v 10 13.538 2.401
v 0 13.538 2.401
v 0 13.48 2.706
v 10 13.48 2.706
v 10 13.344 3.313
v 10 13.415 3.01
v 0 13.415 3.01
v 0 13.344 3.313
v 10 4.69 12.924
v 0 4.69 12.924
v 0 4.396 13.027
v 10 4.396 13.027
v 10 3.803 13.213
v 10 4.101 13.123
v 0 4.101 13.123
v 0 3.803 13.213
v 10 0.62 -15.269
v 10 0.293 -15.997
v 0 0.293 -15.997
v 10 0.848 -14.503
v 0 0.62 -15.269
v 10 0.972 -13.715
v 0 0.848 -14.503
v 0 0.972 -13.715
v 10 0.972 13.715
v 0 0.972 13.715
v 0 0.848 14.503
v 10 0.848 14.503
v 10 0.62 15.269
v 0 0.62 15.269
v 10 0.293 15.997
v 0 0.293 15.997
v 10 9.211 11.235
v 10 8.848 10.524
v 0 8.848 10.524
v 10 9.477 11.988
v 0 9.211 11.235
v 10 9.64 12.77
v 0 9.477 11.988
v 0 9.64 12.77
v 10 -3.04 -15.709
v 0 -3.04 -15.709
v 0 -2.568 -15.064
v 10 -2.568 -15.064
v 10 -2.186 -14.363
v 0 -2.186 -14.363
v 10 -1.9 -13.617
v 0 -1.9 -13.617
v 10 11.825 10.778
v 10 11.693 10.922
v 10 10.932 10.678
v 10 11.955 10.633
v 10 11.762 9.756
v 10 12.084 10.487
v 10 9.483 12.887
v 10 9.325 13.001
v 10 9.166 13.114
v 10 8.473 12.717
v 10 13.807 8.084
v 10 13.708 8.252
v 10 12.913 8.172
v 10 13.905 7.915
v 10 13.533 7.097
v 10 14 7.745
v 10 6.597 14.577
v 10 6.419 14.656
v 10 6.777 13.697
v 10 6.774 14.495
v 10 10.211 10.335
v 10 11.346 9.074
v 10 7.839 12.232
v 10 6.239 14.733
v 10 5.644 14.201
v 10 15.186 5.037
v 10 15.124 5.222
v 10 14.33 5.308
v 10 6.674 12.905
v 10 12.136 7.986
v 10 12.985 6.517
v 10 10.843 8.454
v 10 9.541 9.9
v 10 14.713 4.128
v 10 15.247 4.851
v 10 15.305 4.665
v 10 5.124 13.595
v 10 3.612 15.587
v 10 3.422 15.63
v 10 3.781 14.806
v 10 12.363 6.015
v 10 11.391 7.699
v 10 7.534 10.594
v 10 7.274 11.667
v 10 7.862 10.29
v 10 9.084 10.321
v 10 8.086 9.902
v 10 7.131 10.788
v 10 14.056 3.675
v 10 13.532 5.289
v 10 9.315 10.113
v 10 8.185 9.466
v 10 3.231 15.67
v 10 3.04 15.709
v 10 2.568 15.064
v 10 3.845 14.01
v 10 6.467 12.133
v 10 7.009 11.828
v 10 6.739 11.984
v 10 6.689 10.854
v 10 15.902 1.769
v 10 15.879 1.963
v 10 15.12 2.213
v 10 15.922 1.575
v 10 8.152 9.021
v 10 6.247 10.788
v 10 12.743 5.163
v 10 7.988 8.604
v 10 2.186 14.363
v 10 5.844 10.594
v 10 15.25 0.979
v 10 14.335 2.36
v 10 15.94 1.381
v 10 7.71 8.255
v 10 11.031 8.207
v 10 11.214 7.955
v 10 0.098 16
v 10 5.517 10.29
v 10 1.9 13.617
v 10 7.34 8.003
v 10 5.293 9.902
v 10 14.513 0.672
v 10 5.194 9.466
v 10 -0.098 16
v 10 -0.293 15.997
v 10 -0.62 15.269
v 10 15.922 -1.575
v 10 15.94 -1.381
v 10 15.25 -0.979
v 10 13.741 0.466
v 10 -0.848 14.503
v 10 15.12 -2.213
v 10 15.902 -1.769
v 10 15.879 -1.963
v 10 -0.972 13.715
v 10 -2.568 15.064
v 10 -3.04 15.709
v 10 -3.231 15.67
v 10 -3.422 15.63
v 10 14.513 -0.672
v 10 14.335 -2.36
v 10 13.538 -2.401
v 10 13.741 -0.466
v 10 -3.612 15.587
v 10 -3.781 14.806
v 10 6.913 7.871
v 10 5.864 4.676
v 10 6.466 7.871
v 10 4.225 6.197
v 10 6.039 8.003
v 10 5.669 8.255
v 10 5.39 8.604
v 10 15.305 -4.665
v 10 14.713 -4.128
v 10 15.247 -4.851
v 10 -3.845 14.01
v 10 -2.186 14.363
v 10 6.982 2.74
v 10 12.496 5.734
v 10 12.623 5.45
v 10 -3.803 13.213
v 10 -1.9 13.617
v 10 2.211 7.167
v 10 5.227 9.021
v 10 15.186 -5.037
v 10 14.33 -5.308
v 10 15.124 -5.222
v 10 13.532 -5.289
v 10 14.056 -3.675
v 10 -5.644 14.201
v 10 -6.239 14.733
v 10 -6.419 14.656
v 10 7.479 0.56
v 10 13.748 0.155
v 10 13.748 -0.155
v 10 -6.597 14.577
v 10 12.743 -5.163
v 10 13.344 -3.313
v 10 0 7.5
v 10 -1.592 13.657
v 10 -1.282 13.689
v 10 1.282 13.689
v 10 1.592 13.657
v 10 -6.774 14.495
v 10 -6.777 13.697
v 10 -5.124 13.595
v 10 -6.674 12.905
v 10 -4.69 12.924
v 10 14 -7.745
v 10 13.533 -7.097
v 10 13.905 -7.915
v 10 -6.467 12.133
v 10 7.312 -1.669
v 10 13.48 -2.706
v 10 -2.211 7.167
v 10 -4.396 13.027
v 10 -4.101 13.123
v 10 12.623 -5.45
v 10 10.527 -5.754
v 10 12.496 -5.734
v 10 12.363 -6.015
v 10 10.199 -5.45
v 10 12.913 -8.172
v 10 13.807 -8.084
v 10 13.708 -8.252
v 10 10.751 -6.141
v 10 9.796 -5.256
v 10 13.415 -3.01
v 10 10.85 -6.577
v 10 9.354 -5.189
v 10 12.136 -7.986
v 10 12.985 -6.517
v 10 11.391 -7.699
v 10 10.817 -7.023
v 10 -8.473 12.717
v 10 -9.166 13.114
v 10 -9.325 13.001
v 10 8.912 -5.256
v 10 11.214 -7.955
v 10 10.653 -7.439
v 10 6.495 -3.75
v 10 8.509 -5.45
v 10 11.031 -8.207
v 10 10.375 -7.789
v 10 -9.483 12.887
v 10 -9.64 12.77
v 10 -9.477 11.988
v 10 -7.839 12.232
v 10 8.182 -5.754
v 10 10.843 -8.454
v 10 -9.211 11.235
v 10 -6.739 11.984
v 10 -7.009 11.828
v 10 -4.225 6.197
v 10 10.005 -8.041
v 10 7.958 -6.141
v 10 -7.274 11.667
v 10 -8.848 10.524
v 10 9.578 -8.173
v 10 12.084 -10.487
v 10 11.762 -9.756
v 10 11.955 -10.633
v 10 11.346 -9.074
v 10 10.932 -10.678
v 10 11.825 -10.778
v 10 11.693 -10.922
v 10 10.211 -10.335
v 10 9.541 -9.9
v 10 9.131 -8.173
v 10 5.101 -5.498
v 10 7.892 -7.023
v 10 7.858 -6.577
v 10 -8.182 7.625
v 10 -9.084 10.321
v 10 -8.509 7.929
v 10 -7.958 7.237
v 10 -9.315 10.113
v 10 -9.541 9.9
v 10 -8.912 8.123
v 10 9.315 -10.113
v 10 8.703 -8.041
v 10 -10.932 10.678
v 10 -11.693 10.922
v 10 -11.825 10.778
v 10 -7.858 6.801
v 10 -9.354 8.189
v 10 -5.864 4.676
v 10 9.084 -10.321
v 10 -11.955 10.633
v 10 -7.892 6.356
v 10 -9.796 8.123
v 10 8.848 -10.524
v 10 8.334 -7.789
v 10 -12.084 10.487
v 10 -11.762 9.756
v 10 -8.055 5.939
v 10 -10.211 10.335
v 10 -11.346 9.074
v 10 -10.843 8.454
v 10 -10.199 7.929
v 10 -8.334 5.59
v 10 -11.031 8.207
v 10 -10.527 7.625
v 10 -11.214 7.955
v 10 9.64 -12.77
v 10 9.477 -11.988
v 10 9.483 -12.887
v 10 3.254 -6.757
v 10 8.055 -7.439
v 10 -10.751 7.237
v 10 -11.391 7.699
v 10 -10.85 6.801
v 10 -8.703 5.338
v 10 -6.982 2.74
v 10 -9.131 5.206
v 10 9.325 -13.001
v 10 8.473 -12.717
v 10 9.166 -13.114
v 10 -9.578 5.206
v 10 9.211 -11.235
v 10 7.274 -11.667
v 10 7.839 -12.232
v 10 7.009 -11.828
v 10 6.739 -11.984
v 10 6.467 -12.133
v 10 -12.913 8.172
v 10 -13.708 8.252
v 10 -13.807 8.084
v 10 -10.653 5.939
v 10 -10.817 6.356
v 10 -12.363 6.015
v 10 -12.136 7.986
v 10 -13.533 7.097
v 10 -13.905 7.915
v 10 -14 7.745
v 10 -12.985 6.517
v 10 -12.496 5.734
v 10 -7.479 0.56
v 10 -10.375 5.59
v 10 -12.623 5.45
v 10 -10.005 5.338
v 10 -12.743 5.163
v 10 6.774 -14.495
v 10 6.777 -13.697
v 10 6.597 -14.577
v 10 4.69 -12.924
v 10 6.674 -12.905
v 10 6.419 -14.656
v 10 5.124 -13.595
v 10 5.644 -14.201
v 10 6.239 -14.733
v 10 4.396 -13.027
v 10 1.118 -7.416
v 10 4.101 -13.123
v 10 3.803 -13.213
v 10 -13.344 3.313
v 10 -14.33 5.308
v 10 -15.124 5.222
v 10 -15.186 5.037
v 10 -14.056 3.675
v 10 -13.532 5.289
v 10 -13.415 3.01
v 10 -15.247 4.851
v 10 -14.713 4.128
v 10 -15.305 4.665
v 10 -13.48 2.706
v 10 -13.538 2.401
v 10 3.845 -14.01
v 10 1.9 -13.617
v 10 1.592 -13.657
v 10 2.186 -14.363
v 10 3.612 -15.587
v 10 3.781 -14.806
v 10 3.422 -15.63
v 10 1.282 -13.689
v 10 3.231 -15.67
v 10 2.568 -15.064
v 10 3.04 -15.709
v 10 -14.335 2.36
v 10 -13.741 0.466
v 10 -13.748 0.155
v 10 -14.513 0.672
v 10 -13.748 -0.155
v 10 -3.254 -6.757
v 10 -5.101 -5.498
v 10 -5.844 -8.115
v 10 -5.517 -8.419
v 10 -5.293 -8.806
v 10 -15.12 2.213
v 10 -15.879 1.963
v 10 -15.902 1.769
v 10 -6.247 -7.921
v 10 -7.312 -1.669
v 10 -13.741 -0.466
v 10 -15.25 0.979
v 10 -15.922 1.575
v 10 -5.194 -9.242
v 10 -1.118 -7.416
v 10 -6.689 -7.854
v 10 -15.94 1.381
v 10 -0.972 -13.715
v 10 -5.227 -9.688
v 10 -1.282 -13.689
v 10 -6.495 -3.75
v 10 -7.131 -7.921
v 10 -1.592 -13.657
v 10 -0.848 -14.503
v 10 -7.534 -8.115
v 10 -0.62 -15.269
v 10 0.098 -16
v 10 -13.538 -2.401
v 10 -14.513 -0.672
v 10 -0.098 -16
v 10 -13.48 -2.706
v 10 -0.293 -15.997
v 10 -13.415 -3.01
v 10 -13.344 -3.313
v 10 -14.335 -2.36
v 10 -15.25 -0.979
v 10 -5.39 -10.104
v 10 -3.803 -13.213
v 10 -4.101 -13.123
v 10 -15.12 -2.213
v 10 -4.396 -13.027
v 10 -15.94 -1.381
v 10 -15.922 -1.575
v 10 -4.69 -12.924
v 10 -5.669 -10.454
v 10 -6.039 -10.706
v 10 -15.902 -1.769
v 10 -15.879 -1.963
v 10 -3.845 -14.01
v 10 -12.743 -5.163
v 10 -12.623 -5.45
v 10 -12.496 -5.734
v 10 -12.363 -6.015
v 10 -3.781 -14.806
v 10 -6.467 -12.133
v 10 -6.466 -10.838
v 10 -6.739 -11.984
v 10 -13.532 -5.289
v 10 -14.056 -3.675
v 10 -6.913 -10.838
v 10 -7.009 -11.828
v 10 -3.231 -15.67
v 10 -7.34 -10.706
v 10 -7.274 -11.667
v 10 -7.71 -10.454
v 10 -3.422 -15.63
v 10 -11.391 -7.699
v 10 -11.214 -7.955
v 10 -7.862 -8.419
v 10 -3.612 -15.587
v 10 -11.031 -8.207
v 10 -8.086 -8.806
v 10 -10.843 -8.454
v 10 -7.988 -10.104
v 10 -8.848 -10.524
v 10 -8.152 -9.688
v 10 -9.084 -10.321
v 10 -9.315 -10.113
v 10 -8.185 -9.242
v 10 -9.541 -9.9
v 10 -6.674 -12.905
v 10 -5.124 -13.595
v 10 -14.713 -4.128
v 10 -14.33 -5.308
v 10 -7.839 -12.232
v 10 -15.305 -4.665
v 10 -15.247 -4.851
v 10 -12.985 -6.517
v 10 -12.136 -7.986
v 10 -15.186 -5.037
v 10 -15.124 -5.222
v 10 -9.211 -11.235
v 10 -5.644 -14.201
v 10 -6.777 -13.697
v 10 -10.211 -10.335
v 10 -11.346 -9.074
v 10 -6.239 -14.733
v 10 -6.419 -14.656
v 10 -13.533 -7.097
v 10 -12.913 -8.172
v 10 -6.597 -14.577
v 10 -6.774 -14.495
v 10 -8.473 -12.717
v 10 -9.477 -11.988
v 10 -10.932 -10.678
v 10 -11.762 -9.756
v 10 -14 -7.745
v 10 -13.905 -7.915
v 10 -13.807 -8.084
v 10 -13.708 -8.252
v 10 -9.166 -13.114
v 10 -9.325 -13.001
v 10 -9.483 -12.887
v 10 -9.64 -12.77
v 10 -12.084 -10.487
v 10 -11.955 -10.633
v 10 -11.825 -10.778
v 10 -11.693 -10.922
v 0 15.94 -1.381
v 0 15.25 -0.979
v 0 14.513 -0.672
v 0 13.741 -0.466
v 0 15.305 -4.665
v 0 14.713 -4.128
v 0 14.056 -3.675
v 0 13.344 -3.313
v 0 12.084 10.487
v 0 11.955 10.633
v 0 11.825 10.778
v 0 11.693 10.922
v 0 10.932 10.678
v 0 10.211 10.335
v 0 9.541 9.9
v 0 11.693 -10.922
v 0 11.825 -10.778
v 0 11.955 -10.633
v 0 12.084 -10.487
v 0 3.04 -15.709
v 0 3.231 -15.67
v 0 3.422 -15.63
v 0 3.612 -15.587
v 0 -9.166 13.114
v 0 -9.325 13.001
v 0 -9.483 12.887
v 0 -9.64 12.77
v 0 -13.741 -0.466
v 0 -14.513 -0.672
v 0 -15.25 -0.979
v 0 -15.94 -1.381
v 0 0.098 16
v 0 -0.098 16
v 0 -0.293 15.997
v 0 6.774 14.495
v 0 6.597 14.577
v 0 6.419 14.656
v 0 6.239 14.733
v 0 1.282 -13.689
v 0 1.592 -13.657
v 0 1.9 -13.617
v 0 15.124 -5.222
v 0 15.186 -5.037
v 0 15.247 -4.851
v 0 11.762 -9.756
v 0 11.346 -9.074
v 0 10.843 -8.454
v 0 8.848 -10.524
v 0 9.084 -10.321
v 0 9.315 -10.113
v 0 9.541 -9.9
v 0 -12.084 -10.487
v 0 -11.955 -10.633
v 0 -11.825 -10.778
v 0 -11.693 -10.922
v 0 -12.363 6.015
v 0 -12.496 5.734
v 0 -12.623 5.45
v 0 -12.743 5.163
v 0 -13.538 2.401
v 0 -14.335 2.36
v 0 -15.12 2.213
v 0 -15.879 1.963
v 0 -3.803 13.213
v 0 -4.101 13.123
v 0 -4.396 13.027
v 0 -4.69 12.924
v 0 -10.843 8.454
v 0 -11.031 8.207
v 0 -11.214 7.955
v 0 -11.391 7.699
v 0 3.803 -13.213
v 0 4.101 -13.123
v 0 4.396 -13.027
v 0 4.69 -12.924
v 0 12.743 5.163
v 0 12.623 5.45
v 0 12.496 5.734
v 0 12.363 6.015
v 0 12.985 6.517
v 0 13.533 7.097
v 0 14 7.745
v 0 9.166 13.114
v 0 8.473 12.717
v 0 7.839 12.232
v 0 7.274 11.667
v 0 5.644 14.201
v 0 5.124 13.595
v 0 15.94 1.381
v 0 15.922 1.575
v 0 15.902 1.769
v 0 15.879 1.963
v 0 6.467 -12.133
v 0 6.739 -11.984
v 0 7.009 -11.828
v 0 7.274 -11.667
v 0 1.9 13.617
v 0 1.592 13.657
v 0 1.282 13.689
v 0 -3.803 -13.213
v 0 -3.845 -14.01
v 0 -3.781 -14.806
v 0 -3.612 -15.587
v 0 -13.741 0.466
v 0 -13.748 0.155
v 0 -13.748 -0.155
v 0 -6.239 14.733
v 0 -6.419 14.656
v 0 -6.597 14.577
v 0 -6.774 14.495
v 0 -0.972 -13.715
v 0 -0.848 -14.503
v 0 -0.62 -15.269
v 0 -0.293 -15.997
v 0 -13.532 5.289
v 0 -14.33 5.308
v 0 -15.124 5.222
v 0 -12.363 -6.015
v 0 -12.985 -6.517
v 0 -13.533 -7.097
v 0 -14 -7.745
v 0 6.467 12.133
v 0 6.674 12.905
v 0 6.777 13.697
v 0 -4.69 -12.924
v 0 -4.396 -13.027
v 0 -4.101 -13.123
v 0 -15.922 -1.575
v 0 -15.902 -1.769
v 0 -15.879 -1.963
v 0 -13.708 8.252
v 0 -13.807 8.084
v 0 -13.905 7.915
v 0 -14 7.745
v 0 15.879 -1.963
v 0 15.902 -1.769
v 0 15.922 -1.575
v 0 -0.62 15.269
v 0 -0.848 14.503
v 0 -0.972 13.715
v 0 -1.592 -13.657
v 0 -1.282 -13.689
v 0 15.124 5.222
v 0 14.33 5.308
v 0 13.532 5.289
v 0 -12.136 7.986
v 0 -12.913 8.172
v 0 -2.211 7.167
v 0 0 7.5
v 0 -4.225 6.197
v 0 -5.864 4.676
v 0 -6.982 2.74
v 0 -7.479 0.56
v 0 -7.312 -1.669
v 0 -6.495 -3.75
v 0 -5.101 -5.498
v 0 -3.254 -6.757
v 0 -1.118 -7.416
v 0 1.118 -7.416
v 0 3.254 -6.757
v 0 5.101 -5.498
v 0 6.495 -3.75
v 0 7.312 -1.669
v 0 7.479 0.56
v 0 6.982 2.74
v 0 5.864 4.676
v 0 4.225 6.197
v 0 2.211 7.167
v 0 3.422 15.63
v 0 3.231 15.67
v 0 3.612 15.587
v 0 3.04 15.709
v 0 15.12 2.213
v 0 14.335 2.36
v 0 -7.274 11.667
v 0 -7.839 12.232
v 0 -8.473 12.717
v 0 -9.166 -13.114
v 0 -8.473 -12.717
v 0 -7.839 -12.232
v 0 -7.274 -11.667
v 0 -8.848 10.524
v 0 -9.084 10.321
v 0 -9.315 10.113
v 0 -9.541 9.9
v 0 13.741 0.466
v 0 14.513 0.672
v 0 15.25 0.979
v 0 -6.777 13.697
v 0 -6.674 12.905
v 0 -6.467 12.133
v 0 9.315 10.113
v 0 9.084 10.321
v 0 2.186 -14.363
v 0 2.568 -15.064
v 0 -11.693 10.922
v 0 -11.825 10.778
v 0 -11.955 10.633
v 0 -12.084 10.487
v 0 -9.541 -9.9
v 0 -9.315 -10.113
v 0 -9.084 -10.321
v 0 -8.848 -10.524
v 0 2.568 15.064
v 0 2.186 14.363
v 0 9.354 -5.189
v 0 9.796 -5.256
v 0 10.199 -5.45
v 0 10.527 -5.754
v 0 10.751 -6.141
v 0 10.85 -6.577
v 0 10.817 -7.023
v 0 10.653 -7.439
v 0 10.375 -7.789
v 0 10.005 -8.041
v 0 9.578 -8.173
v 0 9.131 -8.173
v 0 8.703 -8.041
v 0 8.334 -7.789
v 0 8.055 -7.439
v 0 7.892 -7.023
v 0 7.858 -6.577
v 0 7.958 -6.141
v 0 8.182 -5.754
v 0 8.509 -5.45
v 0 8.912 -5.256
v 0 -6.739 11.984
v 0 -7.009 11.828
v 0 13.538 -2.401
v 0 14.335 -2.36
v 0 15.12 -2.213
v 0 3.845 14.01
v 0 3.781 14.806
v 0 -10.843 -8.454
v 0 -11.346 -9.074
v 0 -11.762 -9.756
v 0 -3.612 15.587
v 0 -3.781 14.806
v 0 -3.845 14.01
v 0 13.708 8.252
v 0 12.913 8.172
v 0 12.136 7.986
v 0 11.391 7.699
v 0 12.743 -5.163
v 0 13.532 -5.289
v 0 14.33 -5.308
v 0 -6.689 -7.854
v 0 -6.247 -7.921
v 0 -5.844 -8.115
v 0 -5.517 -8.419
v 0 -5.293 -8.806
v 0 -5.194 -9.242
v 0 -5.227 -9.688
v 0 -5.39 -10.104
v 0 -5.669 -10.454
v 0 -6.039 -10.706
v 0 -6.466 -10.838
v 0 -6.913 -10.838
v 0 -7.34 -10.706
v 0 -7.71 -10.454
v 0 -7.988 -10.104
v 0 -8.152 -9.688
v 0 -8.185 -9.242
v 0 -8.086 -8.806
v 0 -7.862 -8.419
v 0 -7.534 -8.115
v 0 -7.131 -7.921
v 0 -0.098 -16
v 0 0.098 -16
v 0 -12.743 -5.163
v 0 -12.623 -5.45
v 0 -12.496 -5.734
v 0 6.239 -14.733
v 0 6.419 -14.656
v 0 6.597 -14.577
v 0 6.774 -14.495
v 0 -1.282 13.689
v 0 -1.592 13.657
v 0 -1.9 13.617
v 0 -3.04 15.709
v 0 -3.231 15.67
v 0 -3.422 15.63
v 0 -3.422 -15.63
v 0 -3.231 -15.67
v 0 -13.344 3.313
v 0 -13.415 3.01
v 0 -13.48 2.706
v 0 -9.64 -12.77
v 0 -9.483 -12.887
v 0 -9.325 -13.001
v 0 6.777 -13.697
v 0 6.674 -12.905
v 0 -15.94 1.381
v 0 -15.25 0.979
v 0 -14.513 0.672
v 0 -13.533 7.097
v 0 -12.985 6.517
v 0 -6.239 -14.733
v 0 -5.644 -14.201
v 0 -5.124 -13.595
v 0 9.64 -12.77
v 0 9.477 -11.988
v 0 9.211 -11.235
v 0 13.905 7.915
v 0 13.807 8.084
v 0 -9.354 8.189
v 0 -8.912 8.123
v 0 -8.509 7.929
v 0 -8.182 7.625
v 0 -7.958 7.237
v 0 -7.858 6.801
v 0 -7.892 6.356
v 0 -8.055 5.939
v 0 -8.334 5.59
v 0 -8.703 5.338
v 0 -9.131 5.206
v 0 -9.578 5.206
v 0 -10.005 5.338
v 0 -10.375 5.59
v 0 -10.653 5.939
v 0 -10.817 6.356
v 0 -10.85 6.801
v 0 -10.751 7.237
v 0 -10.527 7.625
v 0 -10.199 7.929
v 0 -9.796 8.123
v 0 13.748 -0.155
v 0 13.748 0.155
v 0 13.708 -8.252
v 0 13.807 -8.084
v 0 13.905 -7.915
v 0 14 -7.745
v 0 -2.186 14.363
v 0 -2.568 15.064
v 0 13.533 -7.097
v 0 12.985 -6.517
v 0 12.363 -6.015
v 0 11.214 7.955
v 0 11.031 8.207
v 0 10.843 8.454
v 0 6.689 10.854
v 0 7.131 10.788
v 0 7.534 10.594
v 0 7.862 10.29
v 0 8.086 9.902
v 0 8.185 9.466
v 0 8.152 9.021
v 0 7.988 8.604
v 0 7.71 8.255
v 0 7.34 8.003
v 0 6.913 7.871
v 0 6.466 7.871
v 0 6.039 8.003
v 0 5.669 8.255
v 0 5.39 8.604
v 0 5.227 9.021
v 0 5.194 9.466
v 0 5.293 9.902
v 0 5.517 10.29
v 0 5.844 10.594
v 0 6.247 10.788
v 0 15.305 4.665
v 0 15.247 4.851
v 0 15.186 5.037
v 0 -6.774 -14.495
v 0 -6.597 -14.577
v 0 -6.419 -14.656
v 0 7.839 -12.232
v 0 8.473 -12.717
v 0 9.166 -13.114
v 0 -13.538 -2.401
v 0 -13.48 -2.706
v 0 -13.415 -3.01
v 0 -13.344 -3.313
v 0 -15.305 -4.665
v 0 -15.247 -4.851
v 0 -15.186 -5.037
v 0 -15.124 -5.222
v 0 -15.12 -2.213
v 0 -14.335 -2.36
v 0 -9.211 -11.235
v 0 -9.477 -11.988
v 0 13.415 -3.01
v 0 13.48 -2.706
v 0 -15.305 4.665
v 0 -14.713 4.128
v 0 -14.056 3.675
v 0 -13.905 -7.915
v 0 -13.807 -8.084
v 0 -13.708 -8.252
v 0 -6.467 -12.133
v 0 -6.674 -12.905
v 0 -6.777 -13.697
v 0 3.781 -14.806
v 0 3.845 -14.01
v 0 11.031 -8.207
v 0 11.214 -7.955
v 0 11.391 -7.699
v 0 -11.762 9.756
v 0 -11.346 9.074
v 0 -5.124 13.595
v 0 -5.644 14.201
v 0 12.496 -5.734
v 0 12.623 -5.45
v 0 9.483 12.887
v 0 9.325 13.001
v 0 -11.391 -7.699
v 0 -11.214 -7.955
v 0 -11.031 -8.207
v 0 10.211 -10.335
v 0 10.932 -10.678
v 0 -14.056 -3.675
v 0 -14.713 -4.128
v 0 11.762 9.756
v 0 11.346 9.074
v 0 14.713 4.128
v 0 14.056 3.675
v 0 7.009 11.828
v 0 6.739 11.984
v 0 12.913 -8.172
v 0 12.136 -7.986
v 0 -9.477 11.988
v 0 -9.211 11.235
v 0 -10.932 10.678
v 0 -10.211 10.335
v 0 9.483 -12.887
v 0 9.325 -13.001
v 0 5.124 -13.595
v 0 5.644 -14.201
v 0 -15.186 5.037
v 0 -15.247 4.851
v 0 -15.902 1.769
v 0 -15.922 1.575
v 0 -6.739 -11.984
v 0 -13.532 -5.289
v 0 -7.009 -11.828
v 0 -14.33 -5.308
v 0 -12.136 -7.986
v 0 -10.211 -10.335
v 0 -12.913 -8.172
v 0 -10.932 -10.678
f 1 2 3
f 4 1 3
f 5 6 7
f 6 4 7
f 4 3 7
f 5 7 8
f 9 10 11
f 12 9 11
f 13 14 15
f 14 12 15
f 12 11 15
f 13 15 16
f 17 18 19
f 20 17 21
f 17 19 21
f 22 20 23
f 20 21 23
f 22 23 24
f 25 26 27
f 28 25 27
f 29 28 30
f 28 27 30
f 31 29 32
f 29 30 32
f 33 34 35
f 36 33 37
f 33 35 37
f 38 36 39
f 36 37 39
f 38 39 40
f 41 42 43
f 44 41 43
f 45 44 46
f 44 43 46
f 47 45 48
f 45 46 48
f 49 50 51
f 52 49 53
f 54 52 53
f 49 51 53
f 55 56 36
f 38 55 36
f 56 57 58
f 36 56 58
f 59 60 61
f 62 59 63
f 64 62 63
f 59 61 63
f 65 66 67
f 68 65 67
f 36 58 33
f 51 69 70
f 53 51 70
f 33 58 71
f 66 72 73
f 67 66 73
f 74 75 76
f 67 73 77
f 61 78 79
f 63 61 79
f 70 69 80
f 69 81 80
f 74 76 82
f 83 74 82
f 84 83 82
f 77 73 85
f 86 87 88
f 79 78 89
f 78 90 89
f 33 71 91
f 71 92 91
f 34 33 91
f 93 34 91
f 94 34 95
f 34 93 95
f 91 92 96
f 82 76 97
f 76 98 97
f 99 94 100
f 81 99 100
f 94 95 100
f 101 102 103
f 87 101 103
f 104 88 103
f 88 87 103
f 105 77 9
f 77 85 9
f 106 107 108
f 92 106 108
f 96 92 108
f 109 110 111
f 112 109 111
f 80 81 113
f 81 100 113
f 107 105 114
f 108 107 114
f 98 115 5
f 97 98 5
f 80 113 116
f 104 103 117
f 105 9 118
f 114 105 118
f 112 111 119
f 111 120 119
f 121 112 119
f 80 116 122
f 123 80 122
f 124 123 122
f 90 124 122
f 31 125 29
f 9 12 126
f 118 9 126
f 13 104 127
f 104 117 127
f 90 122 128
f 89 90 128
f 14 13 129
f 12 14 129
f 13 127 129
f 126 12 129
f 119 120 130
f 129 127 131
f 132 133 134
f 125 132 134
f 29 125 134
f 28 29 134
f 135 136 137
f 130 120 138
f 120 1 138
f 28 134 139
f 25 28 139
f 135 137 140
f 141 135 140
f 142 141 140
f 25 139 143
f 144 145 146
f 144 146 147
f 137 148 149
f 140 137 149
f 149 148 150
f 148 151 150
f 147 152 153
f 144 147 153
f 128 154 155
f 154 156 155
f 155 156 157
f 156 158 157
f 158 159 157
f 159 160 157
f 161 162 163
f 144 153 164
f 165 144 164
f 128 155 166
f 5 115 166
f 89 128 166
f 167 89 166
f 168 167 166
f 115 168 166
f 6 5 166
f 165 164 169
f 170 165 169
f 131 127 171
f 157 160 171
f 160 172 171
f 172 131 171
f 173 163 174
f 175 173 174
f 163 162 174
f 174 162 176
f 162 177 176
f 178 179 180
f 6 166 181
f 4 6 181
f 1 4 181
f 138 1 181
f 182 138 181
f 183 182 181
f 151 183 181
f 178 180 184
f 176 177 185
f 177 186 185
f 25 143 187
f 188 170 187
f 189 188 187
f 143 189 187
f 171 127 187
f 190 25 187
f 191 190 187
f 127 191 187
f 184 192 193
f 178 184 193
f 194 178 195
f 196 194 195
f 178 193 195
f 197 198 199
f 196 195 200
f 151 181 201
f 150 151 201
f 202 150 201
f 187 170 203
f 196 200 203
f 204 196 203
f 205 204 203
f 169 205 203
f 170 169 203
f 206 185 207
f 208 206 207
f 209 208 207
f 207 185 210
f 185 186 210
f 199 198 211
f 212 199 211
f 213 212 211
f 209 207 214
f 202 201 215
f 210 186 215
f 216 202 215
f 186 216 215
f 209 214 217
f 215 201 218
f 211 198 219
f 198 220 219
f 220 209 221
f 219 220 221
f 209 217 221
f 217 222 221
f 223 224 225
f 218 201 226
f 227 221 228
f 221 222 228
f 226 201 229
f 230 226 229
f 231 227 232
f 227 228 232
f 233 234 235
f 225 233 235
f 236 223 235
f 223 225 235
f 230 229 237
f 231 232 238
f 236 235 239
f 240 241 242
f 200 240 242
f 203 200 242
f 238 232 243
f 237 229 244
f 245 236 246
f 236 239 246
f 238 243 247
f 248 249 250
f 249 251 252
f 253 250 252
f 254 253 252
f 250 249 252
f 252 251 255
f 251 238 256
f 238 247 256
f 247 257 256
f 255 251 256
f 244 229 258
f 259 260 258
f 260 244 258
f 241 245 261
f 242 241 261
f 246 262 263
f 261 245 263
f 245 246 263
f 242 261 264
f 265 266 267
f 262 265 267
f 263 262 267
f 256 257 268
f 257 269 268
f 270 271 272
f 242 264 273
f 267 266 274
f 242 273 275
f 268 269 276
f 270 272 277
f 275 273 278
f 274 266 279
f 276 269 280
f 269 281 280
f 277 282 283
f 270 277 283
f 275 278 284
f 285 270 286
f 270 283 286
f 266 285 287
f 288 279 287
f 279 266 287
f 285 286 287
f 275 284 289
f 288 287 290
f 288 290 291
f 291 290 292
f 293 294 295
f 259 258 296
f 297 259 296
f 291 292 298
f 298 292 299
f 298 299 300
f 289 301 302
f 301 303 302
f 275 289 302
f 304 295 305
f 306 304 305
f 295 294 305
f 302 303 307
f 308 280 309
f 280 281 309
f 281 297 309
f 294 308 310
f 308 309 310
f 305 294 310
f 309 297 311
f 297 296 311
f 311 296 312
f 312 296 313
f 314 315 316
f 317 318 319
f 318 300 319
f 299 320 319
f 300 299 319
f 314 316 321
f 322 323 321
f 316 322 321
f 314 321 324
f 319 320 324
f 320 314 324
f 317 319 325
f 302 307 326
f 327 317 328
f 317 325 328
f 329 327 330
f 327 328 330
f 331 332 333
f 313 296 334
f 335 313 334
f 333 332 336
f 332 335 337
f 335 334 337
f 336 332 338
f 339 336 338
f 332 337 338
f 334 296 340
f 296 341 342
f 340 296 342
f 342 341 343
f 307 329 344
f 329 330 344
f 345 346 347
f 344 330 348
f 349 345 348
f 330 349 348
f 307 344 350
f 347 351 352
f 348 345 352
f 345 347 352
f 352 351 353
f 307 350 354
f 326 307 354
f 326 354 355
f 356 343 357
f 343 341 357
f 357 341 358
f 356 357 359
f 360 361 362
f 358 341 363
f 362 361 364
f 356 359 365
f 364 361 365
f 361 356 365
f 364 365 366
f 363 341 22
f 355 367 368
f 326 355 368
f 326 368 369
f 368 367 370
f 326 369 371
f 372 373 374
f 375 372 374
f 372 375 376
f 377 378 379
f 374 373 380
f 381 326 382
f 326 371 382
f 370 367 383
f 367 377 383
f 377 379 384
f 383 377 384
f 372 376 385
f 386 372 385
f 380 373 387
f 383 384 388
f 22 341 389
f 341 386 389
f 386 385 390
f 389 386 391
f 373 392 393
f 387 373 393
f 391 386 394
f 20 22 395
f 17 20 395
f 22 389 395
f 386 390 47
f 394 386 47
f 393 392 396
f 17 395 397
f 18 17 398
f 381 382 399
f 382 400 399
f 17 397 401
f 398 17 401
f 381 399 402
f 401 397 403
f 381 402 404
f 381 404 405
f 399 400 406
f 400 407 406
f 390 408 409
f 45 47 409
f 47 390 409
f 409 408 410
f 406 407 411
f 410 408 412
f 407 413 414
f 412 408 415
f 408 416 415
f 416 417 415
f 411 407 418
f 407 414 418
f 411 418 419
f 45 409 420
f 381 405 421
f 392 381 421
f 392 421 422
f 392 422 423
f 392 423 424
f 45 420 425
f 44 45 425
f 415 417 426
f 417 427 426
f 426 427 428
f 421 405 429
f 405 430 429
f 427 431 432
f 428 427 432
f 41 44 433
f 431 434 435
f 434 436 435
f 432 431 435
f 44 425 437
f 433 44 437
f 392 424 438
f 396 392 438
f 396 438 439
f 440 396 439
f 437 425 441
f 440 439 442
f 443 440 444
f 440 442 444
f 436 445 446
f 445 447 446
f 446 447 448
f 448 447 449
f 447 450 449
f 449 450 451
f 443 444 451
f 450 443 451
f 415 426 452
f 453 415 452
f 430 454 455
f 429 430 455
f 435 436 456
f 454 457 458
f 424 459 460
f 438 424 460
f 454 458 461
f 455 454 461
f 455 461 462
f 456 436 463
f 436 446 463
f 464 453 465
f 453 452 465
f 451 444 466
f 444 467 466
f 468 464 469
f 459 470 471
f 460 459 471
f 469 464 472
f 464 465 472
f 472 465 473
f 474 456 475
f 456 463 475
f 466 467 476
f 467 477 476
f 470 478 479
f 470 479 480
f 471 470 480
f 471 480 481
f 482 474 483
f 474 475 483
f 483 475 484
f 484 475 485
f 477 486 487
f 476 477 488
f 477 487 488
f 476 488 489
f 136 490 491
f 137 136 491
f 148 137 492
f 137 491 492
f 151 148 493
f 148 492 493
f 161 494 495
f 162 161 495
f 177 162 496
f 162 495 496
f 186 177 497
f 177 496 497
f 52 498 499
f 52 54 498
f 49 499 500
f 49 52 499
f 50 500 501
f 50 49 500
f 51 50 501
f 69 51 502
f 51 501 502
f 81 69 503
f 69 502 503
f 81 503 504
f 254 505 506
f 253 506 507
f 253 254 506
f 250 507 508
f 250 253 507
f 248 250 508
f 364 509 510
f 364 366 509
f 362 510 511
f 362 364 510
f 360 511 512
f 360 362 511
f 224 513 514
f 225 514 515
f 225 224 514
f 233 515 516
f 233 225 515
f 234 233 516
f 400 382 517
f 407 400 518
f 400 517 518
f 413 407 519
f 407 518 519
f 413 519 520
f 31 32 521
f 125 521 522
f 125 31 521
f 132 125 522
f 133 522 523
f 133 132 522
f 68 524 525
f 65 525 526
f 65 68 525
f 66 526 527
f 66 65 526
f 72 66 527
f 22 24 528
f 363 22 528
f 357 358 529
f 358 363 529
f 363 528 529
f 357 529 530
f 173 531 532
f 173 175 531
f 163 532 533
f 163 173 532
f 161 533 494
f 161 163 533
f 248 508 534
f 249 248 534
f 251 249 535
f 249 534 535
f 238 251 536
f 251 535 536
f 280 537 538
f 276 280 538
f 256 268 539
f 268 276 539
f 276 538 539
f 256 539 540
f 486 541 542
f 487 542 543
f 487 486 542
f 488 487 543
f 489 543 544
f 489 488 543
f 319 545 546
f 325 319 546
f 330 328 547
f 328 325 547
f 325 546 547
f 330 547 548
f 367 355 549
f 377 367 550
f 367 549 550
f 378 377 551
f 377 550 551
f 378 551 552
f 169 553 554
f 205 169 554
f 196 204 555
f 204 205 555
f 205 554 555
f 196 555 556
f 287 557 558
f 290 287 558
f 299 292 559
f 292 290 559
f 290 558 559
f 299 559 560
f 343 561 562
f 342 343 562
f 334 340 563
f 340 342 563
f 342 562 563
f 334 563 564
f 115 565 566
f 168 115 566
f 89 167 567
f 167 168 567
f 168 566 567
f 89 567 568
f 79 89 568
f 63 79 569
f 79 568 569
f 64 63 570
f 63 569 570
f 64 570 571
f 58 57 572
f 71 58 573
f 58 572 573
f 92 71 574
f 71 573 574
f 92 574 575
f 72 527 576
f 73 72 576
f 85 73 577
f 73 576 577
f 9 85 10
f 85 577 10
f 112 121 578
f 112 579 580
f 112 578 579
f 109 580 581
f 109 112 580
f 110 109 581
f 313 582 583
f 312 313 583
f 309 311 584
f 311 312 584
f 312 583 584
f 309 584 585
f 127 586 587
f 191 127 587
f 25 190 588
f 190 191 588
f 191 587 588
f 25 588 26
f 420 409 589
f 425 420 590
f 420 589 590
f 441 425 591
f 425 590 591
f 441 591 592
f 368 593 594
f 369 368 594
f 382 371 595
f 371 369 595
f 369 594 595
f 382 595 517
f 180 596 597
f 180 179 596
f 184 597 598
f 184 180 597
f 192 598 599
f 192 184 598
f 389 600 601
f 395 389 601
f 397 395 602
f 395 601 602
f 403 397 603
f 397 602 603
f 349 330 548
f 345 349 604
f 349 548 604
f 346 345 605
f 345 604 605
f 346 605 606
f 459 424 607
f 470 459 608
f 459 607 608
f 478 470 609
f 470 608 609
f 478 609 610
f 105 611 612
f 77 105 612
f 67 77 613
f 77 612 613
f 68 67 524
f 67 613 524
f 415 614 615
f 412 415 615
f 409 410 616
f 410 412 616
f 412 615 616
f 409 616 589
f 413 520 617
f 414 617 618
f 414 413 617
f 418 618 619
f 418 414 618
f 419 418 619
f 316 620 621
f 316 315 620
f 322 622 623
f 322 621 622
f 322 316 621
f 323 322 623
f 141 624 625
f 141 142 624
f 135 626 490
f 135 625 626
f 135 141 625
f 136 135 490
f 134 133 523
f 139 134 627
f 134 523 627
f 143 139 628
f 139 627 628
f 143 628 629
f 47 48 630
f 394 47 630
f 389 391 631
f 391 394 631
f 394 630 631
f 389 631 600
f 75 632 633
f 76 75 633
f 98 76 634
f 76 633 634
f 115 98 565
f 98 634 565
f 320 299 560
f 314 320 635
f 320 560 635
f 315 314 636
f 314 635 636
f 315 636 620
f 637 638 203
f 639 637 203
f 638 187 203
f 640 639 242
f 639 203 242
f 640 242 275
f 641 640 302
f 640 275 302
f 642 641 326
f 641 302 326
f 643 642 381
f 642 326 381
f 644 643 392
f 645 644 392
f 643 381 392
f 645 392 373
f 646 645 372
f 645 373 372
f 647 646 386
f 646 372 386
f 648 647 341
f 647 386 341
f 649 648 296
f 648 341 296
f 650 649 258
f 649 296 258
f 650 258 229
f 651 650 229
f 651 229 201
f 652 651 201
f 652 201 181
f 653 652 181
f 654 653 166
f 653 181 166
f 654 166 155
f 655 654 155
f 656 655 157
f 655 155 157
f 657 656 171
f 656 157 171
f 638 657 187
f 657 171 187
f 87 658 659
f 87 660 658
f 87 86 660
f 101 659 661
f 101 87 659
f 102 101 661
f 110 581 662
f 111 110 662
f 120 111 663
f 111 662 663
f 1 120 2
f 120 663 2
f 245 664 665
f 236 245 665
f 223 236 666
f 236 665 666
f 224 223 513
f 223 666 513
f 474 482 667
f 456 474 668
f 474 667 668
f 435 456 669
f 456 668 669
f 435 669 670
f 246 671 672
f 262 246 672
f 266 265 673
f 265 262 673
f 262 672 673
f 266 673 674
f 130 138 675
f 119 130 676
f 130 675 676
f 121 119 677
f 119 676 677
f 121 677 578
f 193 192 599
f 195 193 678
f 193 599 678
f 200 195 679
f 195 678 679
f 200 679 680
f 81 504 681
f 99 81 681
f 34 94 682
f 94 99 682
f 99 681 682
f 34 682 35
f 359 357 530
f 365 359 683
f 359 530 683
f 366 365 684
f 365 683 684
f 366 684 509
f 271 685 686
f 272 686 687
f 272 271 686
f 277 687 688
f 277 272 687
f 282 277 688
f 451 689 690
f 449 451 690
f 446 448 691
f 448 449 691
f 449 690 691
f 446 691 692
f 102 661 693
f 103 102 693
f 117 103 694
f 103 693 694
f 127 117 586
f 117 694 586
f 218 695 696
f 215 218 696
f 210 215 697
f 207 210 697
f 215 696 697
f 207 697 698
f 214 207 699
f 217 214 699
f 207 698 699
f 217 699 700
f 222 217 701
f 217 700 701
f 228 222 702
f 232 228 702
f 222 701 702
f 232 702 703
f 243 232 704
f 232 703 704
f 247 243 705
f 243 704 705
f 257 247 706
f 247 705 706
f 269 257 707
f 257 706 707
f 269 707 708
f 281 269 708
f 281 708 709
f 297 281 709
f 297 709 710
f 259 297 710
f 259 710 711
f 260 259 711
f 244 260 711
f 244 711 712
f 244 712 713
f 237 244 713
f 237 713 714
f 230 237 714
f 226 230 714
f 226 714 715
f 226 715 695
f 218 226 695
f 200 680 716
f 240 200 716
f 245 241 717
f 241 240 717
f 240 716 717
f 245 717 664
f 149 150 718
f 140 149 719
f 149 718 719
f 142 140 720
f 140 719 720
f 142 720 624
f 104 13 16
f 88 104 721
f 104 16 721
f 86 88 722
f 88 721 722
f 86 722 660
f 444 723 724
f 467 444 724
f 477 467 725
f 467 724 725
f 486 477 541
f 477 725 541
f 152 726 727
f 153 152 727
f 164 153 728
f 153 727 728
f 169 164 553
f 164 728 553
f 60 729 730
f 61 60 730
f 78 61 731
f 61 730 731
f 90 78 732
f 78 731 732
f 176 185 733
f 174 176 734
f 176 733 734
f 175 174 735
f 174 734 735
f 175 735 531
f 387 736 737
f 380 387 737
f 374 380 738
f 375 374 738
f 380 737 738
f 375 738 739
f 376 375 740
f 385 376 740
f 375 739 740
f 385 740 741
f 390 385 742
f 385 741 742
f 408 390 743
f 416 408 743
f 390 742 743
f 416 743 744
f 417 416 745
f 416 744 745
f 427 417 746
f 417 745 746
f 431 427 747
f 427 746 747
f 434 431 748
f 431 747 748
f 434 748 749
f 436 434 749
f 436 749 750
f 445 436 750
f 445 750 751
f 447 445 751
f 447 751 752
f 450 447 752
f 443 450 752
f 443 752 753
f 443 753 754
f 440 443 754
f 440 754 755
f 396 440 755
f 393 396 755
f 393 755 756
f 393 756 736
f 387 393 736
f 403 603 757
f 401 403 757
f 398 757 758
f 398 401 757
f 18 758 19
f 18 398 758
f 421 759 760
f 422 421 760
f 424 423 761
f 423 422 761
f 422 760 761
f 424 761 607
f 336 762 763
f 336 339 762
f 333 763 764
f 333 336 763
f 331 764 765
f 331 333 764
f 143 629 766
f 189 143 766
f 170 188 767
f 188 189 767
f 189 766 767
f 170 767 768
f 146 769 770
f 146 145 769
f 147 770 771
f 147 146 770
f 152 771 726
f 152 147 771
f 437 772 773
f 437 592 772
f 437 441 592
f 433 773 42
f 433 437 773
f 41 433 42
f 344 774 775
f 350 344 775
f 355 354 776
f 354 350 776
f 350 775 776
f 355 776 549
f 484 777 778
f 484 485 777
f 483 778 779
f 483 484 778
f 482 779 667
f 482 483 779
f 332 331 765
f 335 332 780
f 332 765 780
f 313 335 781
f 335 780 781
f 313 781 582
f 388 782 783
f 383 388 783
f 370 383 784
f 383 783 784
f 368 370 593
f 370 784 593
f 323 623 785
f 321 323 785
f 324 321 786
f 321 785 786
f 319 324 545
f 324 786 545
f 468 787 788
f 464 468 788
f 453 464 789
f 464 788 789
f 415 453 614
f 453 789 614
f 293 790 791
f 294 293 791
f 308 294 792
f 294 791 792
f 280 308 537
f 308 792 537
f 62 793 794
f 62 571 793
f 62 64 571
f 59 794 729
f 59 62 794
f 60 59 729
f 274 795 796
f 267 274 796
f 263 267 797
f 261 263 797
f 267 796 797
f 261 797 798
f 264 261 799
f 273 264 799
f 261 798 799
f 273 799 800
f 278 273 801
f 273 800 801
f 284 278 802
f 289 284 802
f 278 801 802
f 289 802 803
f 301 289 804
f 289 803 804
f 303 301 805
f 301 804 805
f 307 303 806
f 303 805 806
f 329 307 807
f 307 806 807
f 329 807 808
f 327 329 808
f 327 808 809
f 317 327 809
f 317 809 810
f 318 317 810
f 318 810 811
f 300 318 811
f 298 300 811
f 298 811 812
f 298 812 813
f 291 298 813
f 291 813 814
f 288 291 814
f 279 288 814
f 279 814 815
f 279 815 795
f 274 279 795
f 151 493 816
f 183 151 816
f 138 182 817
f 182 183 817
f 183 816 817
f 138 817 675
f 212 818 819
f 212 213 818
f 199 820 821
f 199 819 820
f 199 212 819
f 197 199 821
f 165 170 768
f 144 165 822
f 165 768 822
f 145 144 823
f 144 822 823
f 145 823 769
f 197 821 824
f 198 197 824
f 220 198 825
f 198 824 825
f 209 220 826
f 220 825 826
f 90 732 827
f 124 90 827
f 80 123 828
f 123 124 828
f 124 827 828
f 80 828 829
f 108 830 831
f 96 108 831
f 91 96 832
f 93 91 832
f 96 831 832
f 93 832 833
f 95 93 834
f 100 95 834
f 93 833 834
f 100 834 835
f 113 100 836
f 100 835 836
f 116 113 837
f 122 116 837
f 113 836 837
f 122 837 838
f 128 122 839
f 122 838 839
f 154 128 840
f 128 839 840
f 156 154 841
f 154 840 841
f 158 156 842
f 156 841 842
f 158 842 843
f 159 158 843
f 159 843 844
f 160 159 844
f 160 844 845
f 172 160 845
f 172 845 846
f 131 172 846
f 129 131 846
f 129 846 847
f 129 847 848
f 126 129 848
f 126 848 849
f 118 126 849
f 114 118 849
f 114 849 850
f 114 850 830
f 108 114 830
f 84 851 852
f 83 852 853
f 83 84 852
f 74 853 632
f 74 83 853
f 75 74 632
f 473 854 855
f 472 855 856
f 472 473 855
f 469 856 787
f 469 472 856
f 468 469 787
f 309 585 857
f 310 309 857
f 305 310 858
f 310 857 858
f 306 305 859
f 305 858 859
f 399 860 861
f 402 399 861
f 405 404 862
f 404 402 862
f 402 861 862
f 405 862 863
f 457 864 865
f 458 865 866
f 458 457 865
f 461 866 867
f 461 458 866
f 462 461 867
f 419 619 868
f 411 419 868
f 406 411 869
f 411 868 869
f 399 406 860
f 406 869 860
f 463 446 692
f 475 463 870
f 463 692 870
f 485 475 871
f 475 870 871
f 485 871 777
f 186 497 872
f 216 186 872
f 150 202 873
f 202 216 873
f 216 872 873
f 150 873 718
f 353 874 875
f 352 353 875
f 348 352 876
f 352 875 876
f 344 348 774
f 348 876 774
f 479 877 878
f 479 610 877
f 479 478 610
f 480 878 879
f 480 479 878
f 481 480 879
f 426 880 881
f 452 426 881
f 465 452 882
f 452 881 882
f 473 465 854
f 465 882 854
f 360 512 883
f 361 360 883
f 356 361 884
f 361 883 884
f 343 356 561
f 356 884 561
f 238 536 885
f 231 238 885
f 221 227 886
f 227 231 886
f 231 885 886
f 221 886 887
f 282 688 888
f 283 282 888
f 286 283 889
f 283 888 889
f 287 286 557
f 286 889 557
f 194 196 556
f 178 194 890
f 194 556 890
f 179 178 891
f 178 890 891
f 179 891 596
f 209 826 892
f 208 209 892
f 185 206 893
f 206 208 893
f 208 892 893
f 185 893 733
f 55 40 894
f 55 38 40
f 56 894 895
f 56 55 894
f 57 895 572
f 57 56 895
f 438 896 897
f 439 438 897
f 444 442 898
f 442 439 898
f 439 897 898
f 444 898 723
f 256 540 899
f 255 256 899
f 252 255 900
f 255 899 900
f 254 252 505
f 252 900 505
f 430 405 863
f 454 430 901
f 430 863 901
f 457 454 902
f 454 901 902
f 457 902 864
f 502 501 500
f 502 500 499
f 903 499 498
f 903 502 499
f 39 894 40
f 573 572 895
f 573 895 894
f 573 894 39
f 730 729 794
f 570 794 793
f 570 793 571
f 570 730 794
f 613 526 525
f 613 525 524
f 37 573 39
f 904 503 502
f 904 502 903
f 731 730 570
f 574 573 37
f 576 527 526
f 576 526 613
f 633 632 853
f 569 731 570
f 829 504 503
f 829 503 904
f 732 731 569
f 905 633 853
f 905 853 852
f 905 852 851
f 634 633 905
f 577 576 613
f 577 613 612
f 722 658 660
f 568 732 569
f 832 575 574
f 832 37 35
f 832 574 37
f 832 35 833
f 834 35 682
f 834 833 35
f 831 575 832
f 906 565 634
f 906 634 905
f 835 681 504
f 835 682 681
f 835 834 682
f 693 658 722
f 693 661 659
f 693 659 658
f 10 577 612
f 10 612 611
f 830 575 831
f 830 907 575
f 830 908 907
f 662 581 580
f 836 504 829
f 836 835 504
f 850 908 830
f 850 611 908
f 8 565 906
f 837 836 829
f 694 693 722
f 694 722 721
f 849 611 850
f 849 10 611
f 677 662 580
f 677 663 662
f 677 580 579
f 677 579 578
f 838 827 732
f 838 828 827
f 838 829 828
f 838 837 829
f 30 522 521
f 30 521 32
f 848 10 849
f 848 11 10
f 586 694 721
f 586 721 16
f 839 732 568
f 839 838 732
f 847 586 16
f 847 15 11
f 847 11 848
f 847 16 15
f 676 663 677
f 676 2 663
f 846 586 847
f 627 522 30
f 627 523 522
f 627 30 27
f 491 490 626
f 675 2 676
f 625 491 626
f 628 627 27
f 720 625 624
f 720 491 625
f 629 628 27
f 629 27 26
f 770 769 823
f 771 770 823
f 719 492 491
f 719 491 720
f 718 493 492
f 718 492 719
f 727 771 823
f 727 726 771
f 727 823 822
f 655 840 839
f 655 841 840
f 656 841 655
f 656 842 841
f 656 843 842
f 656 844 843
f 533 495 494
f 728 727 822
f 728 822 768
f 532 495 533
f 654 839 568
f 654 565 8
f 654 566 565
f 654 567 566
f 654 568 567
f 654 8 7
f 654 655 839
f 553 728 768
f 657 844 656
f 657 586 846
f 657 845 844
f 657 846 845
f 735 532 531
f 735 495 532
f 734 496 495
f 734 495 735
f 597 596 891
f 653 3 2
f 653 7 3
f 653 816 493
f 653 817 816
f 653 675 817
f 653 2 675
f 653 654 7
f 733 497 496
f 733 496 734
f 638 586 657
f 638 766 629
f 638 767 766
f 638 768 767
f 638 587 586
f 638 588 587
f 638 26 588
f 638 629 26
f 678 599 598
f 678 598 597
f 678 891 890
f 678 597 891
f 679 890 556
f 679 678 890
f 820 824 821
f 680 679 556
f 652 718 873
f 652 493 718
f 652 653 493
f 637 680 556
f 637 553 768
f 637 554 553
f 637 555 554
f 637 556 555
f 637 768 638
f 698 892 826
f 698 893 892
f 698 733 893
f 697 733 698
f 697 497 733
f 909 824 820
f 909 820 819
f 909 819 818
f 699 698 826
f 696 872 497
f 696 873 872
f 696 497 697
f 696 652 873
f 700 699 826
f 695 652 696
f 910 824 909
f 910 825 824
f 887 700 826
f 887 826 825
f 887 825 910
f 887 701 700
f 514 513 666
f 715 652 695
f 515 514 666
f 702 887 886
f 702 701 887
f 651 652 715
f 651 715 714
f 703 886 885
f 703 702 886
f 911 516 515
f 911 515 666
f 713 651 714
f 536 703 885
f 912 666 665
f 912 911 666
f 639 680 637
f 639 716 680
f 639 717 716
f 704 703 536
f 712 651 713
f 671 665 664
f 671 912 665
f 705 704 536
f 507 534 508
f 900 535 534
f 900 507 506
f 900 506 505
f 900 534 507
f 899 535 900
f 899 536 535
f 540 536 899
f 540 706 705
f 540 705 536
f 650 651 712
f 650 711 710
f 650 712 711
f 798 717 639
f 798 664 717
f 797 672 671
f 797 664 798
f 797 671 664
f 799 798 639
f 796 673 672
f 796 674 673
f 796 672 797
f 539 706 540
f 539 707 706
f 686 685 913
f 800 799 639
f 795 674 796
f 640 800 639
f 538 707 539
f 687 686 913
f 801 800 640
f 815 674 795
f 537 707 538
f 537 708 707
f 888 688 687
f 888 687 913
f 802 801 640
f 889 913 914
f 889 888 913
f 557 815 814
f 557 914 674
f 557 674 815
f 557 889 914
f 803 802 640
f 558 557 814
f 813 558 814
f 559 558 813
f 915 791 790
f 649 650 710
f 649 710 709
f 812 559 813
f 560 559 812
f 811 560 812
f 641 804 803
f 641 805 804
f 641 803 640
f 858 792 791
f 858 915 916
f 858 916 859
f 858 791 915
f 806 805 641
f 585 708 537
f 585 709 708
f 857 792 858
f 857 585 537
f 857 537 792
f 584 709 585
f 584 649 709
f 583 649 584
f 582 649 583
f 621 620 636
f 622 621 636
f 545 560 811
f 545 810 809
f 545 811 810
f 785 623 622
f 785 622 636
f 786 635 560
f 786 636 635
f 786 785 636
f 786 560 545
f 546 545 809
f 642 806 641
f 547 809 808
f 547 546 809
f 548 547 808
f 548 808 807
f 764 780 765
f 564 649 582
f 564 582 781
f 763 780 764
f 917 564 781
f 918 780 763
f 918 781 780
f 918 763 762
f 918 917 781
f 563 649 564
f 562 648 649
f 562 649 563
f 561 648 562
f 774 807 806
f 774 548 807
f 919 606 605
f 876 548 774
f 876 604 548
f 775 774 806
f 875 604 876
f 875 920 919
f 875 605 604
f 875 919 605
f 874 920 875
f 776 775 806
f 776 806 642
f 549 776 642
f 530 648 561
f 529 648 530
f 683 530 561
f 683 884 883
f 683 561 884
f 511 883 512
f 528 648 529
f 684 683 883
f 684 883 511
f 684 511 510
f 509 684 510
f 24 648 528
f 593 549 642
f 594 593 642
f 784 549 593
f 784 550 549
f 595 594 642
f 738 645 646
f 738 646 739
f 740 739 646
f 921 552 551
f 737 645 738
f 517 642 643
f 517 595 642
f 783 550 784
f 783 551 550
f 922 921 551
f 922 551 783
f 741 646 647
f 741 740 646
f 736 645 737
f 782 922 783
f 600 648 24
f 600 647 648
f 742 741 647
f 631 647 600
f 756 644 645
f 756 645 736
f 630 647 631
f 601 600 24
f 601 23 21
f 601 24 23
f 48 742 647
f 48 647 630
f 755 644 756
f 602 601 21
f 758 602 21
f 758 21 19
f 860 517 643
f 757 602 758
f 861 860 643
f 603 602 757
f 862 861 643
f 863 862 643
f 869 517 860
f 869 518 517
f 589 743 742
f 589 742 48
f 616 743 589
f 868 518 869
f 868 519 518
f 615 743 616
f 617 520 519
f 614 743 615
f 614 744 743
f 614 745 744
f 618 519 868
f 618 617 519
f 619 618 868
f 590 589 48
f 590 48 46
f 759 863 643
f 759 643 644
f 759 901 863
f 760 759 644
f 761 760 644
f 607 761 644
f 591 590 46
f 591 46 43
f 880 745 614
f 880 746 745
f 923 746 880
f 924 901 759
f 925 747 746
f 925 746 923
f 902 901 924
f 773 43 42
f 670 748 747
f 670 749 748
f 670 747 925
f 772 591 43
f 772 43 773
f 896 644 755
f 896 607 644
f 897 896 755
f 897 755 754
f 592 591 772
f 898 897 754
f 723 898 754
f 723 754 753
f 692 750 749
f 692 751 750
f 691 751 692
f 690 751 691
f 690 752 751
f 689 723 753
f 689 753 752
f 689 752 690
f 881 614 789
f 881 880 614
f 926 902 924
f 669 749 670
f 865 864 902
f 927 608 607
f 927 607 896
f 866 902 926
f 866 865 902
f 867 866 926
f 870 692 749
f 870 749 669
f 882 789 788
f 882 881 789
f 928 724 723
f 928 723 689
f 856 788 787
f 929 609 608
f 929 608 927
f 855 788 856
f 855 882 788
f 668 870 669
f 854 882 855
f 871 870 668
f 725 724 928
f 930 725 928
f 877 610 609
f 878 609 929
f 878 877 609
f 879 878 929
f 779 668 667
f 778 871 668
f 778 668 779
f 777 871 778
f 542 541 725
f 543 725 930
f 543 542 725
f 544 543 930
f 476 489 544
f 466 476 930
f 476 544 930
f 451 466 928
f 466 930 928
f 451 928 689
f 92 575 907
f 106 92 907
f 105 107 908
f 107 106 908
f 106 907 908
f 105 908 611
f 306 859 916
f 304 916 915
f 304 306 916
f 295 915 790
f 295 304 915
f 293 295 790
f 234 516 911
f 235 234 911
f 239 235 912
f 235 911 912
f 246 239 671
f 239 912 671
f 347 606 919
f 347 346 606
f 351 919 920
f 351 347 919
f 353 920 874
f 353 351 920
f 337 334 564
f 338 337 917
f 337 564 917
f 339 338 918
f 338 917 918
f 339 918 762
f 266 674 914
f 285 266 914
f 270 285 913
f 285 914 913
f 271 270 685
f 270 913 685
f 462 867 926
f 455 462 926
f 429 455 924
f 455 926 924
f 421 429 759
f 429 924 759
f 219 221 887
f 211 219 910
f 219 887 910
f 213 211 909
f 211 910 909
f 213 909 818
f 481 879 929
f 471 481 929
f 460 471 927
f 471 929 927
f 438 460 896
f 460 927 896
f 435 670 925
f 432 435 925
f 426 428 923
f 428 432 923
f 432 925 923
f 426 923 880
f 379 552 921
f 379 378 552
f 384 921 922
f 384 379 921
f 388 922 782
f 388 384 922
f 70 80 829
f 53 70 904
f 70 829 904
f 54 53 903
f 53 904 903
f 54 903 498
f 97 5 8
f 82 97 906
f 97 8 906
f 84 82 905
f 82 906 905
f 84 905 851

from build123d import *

# Parameters (mm, degrees)
BASPROSKE_W        = 10
BASPROSKE_H        = 16
TOOTHCUT_DEPTH     = 25.738633754
TEETHCUTS_COUNT    = 30
TEETHCUTS_ANGLE    = 348
BORSKE_R           = 7.5
BORE_DEPTH         = 50.0000508
SKETCH1_R          = 1.5
CUT_EXTRUDE1_DEPTH = 25.700050474


with BuildPart() as part:
    # BasProSke → Base-Revolve (revolve)
    with BuildSketch(Plane(origin=(0, 0, 0), x_dir=(1, 0, 0), z_dir=(0, 1, 0)), mode=Mode.PRIVATE) as base_revolve_sk:
        with Locations((5, 8)):
            Rectangle(BASPROSKE_W, BASPROSKE_H)
    revolve(base_revolve_sk.sketch.rotate(Axis((-10, 0, 0), (1, 0, 0)), 180), axis=Axis((-10, 0, 0), (1, 0, 0)))

    # TooCutSke → ToothCut (cut, through all)
    with BuildSketch(Plane(origin=(0, 0, 0), x_dir=(0, 0, -1), z_dir=(1, 0, 0))):
        with BuildLine():
            ThreePointArc((0.466400716, 13.741086979), (0, 13.749), (-0.466400716, 13.741086979))
            ThreePointArc((-0.466400716, 13.741086979), (-0.819142092, 14.899954875), (-1.3974676, 15.964351834))
            ThreePointArc((-1.3974676, 15.964351834), (0, 16.0254), (1.3974676, 15.964351834))
            ThreePointArc((1.3974676, 15.964351834), (0.819142092, 14.899954875), (0.466400716, 13.741086979))
        make_face()
    toothcut = extrude(amount=TOOTHCUT_DEPTH, mode=Mode.SUBTRACT)

    # TeethCuts: ToothCut ×30 about axis
    teethcuts_axis = Axis((-10, 0, 0), (1, 0, 0))
    for i in range(1, TEETHCUTS_COUNT):
        add(toothcut.rotate(teethcuts_axis, i * TEETHCUTS_ANGLE / (TEETHCUTS_COUNT - 1)), mode=Mode.SUBTRACT)

    # BorSke → Bore (cut, symmetric)
    with BuildSketch(Plane(origin=(0, 0, 0), x_dir=(0, 0, -1), z_dir=(1, 0, 0))):
        with Locations(Location((0, 0, 0), (0, 0, 180))):
            Circle(BORSKE_R)
    extrude(amount=BORE_DEPTH, both=True, mode=Mode.SUBTRACT)

    # Sketch1 → Cut-Extrude1 (cut, through all)
    with BuildSketch(Plane.ZY):
        with Locations((6.689327089, -9.354298643)):
            Circle(SKETCH1_R)
        with Locations((9.354298643, 6.689327088)):
            Circle(SKETCH1_R)
        with Locations((-6.689327088, 9.354298643)):
            Circle(SKETCH1_R)
        with Locations((-9.354298643, -6.689327089)):
            Circle(SKETCH1_R)
    extrude(amount=-CUT_EXTRUDE1_DEPTH, mode=Mode.SUBTRACT)


solid = part.part
